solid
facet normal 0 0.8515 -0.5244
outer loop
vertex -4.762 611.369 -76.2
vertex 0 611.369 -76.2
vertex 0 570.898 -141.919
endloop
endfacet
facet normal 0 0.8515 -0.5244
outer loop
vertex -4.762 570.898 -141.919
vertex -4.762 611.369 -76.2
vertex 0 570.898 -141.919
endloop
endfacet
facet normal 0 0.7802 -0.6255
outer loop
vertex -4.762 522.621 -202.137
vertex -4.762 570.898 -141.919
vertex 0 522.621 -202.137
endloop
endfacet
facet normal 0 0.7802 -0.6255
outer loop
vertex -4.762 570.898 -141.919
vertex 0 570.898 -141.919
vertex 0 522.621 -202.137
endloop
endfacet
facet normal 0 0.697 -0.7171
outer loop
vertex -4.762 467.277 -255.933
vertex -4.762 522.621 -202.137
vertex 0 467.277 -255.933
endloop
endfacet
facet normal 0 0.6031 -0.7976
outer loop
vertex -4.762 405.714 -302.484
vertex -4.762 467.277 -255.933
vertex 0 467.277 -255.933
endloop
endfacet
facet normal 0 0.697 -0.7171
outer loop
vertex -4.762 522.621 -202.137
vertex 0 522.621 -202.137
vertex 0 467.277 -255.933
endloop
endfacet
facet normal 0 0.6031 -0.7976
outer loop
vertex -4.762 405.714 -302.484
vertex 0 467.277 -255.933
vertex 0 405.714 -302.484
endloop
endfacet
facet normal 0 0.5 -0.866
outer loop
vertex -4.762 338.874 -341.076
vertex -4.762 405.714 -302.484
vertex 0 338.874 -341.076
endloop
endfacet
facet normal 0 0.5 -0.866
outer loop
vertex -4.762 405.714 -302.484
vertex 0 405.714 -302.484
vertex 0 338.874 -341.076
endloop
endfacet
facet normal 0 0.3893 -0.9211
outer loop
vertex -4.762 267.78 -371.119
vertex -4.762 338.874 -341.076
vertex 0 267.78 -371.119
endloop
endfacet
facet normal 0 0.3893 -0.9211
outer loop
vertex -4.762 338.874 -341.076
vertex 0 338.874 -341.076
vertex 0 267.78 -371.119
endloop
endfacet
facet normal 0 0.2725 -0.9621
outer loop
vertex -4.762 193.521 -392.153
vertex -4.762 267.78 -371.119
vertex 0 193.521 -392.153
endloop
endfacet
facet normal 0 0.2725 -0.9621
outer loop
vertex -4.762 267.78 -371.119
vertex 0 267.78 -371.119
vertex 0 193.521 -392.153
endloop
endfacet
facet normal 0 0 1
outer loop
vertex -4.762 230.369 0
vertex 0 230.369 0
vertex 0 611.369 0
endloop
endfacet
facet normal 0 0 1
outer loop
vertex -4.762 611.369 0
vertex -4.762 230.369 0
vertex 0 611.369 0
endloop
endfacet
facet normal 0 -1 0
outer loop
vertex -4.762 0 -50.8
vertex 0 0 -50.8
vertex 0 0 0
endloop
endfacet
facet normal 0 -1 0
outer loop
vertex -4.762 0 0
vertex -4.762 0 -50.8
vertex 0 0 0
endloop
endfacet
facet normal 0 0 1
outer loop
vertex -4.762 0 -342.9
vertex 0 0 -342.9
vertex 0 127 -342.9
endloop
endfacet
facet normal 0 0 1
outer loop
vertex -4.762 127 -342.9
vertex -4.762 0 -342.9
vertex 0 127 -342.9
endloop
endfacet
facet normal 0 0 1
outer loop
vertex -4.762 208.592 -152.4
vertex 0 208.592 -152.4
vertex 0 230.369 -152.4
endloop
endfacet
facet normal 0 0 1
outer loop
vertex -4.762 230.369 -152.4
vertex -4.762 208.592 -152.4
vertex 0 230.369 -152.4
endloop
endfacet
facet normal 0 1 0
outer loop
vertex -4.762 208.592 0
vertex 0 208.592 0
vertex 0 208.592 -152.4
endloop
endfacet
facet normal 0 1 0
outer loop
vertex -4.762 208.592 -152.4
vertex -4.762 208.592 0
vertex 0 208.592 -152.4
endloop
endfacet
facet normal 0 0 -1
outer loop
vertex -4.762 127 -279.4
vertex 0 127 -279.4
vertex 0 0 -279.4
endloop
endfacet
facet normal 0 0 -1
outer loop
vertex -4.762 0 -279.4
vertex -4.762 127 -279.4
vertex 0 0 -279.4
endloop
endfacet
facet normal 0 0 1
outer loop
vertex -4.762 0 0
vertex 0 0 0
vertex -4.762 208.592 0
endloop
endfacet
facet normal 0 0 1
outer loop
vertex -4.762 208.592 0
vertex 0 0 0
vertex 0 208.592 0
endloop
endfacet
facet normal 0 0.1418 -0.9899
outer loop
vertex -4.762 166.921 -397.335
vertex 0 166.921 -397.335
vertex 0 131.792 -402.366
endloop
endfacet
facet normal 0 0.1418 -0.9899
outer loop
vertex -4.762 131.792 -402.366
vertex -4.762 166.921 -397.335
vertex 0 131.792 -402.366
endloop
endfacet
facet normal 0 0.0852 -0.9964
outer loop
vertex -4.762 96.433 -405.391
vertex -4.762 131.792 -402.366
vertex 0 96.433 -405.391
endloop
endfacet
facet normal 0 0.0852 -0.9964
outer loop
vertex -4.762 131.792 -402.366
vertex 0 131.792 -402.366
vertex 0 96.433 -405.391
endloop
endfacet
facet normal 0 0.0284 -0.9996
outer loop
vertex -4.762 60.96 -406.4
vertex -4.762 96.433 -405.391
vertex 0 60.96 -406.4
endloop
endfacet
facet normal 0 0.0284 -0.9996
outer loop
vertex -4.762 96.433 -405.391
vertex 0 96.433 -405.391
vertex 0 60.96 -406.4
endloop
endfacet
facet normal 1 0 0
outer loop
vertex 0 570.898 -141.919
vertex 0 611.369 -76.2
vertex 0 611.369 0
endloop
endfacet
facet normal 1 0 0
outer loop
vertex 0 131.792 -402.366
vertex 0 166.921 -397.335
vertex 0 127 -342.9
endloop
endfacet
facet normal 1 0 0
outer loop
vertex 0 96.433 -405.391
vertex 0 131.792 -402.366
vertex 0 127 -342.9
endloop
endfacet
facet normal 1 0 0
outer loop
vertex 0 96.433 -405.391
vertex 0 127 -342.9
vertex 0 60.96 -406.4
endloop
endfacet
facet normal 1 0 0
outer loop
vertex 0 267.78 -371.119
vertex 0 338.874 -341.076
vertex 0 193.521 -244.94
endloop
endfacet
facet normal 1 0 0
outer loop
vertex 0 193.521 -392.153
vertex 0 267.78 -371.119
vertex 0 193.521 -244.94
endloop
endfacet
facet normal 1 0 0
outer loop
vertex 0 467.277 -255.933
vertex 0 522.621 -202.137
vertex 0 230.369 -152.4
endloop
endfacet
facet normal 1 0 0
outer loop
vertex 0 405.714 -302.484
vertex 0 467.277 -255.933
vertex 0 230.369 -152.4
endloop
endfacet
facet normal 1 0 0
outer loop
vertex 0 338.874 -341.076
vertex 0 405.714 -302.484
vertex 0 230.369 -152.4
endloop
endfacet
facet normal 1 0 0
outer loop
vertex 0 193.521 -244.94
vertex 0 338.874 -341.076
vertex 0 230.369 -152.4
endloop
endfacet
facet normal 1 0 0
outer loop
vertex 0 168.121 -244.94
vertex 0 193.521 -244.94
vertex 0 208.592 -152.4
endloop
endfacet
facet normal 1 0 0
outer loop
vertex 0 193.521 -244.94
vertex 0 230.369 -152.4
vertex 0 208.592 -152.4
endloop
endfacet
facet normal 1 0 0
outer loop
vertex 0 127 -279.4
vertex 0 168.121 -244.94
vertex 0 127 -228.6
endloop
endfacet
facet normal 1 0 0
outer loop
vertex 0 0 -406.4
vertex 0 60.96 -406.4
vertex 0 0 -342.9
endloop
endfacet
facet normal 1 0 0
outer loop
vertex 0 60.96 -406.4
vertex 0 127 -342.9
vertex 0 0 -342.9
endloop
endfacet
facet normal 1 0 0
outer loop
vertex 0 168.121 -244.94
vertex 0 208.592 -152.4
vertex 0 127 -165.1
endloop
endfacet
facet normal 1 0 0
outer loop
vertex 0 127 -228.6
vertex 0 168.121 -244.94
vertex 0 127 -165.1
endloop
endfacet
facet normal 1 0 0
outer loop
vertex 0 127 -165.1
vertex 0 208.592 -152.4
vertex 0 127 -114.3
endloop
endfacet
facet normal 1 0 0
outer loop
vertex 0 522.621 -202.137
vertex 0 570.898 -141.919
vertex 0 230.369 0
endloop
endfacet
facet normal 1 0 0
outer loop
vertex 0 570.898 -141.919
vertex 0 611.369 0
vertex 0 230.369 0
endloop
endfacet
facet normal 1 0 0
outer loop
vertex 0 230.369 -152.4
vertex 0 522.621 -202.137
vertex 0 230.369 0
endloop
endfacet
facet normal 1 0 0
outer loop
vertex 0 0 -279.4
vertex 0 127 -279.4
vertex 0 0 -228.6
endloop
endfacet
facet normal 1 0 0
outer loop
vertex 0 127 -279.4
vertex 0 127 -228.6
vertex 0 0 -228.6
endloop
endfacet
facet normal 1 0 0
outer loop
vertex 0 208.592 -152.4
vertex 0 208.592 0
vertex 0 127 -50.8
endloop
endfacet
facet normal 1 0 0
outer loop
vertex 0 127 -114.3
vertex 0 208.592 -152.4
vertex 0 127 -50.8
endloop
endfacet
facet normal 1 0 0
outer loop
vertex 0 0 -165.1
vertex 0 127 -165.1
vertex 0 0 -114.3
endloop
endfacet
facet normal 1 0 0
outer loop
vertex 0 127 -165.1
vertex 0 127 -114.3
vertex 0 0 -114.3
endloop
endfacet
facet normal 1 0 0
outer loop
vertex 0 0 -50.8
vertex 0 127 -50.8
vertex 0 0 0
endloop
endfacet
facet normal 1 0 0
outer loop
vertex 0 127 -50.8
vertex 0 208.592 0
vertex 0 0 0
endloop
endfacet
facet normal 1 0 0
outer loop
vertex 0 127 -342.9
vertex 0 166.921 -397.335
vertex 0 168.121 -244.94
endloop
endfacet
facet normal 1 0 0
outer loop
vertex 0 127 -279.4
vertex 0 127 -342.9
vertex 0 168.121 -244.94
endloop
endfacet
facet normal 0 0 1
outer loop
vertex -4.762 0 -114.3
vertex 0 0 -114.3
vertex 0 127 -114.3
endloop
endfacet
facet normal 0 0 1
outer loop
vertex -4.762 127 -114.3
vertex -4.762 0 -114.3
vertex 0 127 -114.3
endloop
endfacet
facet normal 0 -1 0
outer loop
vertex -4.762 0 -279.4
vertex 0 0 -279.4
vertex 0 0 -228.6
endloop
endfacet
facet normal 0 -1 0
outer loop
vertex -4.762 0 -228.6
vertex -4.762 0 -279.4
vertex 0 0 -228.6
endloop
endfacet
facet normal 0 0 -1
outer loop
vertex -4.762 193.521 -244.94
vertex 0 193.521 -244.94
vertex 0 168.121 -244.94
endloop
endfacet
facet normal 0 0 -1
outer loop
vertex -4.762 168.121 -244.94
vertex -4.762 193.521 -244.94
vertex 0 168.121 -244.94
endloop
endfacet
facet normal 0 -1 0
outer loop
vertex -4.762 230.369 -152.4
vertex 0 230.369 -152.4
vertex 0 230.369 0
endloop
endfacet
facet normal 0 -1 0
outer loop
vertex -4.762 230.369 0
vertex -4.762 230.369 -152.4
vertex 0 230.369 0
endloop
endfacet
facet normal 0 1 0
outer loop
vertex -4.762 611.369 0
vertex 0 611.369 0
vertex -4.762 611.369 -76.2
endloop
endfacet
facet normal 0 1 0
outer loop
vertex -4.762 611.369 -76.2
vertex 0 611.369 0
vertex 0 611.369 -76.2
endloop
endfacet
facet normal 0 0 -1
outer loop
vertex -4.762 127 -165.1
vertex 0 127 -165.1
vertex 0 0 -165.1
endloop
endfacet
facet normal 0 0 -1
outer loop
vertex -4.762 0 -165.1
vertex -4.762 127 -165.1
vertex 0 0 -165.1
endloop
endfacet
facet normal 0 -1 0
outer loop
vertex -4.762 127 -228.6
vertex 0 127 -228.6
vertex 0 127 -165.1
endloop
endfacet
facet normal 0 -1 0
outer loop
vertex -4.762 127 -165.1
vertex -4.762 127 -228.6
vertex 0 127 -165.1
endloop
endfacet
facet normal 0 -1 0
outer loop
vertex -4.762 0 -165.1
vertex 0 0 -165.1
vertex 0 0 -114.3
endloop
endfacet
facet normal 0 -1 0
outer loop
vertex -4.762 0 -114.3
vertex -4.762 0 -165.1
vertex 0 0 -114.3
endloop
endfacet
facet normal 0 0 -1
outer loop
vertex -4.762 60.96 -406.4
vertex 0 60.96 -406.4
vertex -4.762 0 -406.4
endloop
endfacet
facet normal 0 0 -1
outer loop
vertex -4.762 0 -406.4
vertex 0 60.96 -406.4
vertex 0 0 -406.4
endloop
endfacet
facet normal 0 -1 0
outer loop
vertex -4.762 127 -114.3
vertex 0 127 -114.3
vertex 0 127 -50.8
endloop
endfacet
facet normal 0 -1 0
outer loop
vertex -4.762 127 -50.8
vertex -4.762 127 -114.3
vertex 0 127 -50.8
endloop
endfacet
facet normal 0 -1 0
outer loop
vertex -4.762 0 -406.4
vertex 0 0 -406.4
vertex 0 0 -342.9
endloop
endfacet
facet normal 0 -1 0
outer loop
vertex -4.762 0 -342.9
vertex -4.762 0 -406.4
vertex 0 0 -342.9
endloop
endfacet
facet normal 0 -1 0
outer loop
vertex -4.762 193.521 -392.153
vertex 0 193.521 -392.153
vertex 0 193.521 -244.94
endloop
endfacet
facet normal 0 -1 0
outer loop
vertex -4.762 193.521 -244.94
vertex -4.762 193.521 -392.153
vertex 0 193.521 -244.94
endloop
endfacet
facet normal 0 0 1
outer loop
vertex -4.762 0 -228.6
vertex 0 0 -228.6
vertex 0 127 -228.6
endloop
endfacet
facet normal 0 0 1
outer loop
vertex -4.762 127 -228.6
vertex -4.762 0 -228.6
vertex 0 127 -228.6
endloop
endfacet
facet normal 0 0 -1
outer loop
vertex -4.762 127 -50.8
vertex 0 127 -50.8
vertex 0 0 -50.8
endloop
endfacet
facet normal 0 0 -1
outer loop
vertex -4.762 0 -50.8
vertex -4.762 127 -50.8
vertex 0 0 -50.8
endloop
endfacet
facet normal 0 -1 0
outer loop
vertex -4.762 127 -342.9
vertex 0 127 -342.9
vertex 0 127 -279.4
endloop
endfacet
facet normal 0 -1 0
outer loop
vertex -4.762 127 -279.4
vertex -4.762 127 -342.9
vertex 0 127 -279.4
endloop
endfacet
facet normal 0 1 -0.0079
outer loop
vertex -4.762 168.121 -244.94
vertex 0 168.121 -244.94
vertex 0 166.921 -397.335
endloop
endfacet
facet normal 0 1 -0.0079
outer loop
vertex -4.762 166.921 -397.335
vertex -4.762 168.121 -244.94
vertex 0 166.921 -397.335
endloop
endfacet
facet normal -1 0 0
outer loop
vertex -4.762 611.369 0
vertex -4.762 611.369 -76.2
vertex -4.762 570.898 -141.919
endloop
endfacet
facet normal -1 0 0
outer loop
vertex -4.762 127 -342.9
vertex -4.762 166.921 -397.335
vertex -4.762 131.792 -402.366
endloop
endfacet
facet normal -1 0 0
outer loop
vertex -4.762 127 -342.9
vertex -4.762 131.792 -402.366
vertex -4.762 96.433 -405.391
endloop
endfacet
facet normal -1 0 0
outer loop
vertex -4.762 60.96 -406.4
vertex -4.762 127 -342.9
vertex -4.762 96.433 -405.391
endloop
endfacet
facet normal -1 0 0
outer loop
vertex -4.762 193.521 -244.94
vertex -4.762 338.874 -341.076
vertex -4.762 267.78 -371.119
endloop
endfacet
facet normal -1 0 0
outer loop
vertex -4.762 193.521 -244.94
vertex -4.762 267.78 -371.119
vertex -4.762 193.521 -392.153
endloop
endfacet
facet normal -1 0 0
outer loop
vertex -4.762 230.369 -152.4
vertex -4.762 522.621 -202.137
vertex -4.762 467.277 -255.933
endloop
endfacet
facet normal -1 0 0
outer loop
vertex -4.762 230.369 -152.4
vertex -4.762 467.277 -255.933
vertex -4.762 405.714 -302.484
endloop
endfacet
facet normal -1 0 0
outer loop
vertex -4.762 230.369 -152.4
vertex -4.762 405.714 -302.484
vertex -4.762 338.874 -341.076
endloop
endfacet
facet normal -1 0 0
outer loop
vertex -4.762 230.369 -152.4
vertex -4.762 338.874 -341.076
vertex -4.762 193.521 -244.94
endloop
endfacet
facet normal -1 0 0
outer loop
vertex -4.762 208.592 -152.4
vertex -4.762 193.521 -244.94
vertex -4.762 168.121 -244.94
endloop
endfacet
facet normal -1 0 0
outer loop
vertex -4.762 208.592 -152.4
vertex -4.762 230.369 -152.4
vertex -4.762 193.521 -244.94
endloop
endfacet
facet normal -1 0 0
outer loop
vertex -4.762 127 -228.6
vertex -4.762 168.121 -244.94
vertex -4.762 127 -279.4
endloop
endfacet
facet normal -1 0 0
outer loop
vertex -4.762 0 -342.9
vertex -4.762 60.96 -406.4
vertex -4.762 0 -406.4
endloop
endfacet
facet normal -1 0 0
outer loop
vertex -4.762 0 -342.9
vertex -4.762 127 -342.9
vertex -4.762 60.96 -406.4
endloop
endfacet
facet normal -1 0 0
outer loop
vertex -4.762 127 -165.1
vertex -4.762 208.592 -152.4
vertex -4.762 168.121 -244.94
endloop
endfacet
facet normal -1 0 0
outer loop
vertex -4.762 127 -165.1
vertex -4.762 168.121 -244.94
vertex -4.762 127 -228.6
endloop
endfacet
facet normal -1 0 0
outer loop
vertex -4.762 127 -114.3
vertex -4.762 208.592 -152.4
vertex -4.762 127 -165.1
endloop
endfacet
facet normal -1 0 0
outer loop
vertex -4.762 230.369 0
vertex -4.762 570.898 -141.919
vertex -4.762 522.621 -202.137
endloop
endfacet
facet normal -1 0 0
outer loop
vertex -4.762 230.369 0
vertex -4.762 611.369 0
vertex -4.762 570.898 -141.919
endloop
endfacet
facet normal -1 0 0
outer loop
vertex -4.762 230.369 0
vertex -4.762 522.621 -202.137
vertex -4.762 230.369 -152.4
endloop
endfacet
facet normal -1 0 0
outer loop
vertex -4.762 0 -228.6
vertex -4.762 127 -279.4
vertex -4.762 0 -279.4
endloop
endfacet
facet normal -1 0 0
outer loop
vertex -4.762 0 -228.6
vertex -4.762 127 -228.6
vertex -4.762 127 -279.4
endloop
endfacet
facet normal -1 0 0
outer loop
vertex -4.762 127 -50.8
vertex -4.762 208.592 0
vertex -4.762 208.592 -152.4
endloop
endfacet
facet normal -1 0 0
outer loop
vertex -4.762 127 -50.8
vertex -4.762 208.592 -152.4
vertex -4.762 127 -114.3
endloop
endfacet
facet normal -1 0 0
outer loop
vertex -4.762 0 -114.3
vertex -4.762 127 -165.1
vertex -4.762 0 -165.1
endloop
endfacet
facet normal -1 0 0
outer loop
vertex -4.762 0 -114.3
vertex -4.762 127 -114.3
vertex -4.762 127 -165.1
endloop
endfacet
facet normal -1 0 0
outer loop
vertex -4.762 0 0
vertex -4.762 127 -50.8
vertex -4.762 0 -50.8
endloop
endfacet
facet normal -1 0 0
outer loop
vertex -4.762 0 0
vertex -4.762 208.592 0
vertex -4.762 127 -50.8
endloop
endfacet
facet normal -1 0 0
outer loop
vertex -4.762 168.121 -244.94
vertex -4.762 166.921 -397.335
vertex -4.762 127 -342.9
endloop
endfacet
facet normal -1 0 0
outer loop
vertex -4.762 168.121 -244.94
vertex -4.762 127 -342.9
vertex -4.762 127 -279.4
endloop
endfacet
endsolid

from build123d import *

# Parameters (mm, degrees)
F1_DEPTH = 4.7625
F2_ANGLE = 270


with BuildPart() as f1:
    # F0 (on Front) → F1 (new body)
    with BuildSketch(Plane.XZ):
        with BuildLine():
            Line((-230.3694504243, 0), (-611.3694504243, 0))
            Line((-611.3694504243, 0), (-611.3694504243, -76.2))
            ThreePointArc((-611.3694504243, -76.2), (-437.216196434, -280.1613571834), (-193.5208703627, -392.1532280958))
            Line((-193.5208703627, -392.1532280958), (-193.5208703627, -244.9399656624))
            Line((-193.5208703627, -244.9399656624), (-168.1208703627, -244.9399656624))
            Line((-168.1208703627, -244.9399656624), (-166.920896507, -397.3352413856))
            ThreePointArc((-166.920896507, -397.3352413856), (-114.1339631712, -404.1296791803), (-60.96, -406.4))
            Line((-60.96, -406.4), (0, -406.4))
            Line((0, -406.4), (0, -342.9))
            Line((0, -342.9), (-127, -342.9))
            Line((-127, -342.9), (-127, -279.4))
            Line((-127, -279.4), (0, -279.4))
            Line((0, -279.4), (0, -228.6))
            Line((0, -228.6), (-127, -228.6))
            Line((-127, -228.6), (-127, -165.1))
            Line((-127, -165.1), (0, -165.1))
            Line((0, -165.1), (0, -114.3))
            Line((0, -114.3), (-127, -114.3))
            Line((-127, -114.3), (-127, -50.8))
            Line((-127, -50.8), (0, -50.8))
            Line((0, -50.8), (0, 0))
            Line((0, 0), (-208.5918039083, 0))
            Line((-208.5918039083, 0), (-208.5918039083, -152.4))
            Line((-208.5918039083, -152.4), (-230.3694504243, -152.4))
            Line((-230.3694504243, -152.4), (-230.3694504243, 0))
        make_face()
    extrude(amount=F1_DEPTH)


with BuildPart() as f1_1:
    # F2: moved
    add(f1.part.rotate(Axis((0, 0, -139.7), (0, 0, 1)), F2_ANGLE))


solid = f1_1.part
